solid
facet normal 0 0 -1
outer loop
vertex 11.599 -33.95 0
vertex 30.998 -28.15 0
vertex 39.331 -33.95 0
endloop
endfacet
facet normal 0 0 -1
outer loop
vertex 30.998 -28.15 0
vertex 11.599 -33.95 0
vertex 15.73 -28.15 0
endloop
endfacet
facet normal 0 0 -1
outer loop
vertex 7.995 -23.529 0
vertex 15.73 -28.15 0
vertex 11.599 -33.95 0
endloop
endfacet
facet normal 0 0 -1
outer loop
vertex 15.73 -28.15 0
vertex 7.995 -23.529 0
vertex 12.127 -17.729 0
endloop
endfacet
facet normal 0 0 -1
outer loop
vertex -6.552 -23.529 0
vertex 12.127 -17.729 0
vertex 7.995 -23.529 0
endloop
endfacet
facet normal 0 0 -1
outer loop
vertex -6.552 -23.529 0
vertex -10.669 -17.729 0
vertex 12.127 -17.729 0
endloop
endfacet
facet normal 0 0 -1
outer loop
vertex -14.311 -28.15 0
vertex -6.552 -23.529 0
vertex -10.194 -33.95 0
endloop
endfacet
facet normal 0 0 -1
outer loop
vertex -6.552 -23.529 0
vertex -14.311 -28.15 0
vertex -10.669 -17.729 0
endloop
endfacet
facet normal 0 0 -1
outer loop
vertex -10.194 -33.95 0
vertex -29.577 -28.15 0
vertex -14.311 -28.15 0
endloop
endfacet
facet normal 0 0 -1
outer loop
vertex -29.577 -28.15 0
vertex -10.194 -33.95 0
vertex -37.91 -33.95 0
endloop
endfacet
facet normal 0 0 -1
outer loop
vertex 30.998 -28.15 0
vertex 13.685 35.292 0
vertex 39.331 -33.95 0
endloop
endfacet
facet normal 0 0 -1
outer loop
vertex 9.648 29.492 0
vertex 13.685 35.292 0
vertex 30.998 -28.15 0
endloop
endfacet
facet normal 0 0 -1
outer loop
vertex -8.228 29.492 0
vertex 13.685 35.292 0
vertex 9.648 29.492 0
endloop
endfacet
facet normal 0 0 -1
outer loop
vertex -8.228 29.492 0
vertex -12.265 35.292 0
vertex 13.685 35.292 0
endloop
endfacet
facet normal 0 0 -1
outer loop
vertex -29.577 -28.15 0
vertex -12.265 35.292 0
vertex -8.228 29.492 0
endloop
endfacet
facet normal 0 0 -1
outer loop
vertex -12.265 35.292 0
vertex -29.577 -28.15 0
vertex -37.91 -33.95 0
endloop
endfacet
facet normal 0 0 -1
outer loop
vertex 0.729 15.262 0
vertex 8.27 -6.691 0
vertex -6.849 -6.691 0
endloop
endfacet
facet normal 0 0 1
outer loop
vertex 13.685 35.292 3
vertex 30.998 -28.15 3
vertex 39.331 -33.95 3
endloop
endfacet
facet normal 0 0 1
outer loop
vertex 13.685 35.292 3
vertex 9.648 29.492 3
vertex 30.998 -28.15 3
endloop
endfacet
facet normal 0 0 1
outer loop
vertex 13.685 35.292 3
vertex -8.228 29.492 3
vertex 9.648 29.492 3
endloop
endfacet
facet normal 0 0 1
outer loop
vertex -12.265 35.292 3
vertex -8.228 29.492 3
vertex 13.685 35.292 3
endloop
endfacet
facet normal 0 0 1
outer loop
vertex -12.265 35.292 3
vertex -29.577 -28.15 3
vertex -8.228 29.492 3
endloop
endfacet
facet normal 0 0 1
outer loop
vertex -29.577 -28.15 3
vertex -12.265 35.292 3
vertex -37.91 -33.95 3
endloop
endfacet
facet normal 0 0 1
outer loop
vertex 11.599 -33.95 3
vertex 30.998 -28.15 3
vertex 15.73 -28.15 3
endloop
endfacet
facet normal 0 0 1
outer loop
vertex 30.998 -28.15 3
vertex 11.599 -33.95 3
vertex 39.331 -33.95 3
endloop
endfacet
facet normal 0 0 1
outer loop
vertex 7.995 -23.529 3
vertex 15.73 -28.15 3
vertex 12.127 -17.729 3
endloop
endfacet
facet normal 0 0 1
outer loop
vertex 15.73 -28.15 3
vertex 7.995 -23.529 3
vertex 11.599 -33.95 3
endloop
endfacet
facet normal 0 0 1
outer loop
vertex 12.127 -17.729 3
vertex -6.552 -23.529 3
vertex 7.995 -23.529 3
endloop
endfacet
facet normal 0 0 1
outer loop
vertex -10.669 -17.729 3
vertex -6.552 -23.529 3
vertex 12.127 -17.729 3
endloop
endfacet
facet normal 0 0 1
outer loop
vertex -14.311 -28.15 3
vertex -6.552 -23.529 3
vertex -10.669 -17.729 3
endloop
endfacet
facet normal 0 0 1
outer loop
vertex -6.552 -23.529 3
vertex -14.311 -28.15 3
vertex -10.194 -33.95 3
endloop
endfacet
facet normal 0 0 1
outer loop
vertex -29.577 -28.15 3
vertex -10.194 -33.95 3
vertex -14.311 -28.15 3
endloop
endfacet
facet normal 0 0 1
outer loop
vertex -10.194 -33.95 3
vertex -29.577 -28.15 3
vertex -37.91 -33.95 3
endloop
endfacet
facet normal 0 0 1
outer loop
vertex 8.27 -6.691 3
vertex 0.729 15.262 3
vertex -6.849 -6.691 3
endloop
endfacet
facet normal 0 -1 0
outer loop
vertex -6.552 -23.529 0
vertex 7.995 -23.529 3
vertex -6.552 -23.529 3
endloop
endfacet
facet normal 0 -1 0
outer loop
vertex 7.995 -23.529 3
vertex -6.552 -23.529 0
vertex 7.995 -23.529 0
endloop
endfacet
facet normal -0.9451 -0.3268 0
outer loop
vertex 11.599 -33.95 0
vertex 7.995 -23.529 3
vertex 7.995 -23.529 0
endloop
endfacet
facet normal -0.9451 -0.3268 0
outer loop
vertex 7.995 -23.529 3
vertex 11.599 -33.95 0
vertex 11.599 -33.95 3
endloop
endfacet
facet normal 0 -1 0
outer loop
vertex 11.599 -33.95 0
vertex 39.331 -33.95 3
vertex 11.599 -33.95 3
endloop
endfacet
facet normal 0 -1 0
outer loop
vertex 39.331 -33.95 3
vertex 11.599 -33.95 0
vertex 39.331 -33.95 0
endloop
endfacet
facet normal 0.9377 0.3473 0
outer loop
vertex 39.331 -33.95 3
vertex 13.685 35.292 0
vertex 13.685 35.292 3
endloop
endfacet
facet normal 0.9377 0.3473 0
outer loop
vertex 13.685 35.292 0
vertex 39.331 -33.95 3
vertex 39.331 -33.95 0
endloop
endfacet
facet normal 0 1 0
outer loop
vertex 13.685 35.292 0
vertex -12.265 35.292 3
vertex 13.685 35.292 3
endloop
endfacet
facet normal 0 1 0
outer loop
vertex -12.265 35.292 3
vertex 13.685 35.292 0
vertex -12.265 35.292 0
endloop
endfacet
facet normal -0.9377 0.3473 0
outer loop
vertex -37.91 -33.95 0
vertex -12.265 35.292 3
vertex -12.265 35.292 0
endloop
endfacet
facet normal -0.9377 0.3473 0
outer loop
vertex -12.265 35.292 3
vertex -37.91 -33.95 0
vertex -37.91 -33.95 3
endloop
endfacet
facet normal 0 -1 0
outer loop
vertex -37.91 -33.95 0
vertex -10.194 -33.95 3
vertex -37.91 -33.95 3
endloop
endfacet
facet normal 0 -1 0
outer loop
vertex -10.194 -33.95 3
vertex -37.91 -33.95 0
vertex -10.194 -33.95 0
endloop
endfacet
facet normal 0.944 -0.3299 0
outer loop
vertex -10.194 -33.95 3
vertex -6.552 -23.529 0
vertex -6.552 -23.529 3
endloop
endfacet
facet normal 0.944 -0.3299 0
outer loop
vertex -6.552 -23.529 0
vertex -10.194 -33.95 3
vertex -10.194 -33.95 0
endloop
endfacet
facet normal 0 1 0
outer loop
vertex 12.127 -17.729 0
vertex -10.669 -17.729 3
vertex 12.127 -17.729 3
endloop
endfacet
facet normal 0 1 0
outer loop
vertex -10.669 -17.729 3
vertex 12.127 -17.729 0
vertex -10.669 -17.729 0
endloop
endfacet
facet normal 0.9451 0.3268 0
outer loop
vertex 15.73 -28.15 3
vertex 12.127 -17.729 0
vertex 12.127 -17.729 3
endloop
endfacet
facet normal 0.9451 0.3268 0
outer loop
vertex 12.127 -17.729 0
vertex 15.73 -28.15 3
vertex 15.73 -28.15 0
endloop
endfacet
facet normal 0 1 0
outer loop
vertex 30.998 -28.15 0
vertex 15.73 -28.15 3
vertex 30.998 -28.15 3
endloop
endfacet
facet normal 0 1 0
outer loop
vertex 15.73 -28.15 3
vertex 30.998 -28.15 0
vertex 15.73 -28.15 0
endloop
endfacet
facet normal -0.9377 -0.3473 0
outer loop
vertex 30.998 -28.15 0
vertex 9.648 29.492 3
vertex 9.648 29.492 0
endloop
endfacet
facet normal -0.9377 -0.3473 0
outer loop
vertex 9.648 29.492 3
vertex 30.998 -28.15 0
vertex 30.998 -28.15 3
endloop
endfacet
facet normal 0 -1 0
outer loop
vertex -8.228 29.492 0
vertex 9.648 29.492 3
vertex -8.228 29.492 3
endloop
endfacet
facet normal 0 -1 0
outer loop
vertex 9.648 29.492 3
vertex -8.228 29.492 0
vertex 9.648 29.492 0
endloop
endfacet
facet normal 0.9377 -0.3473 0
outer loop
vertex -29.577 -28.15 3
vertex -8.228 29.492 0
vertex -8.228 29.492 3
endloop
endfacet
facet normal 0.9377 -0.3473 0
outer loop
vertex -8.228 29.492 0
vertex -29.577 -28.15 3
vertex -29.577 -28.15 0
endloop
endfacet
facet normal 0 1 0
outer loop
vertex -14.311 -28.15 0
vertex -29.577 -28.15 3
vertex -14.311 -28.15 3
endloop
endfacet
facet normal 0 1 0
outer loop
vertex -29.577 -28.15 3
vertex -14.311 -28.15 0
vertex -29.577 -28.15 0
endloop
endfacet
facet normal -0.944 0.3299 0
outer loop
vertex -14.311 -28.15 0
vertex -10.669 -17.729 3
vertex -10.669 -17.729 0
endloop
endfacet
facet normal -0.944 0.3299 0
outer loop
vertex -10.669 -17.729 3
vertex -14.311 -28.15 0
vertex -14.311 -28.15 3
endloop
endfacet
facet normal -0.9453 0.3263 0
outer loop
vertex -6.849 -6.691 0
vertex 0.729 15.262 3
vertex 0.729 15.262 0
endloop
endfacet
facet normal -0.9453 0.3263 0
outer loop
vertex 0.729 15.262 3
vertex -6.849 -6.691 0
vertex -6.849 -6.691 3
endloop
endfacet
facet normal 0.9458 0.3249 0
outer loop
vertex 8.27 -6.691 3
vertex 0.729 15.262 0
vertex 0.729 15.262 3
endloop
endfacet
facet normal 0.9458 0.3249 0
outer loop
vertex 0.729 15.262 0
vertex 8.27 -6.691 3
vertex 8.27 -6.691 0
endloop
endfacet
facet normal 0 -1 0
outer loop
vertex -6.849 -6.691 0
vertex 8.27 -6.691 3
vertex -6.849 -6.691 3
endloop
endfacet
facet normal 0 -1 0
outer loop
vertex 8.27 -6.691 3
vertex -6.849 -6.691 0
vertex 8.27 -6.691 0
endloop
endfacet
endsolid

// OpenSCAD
// Separate Letters - 3 Colors
// Generate one letter at a time with 3 color layers
// Tip: render once per letter of your word

// --- Parameters ---
Letter       = "A";
Font         = "Bebas Neue";
Letter_Size  = 60;
Padding      = 6;
Offset       = 2;
Tolerance    = 0.2;
Base_Height  = 3;
Layer_Height = 4;
Part         = "Base";

$fn = 30;

module letter_shape(l, fnt) {
  resize([Letter_Size, 0, 0], auto=true)
  text(l, size=Letter_Size, font=fnt, halign="center", valign="center");
}

module base_part() {
  difference() {
    // Letter silhouette as base with padding
    linear_extrude(Base_Height)
    offset(delta=Padding)
    letter_shape(Letter, str(Font, ":style=Bold"));

    // Pocket for middle layer
    translate([0, 0, Base_Height - Layer_Height + Tolerance])
    linear_extrude(Layer_Height + 1)
    offset(delta=Tolerance)
    letter_shape(Letter, str(Font, ":style=Bold"));
  }
}

module middle_part() {
  difference() {
    linear_extrude(Layer_Height)
    offset(delta=Offset)
    letter_shape(Letter, str(Font, ":style=Bold"));

    translate([0, 0, Layer_Height - Layer_Height + Tolerance])
    linear_extrude(Layer_Height + 1)
    offset(delta=Tolerance)
    letter_shape(Letter, str(Font, ":style=Bold"));
  }
}

module top_part() {
  linear_extrude(Layer_Height)
  letter_shape(Letter, str(Font, ":style=Bold"));
}

if (Part == "Base") {
  base_part();
} else if (Part == "Middle") {
  translate([0, 0, Base_Height])
  middle_part();
} else if (Part == "Top") {
  translate([0, 0, Base_Height + Layer_Height])
  top_part();
}
